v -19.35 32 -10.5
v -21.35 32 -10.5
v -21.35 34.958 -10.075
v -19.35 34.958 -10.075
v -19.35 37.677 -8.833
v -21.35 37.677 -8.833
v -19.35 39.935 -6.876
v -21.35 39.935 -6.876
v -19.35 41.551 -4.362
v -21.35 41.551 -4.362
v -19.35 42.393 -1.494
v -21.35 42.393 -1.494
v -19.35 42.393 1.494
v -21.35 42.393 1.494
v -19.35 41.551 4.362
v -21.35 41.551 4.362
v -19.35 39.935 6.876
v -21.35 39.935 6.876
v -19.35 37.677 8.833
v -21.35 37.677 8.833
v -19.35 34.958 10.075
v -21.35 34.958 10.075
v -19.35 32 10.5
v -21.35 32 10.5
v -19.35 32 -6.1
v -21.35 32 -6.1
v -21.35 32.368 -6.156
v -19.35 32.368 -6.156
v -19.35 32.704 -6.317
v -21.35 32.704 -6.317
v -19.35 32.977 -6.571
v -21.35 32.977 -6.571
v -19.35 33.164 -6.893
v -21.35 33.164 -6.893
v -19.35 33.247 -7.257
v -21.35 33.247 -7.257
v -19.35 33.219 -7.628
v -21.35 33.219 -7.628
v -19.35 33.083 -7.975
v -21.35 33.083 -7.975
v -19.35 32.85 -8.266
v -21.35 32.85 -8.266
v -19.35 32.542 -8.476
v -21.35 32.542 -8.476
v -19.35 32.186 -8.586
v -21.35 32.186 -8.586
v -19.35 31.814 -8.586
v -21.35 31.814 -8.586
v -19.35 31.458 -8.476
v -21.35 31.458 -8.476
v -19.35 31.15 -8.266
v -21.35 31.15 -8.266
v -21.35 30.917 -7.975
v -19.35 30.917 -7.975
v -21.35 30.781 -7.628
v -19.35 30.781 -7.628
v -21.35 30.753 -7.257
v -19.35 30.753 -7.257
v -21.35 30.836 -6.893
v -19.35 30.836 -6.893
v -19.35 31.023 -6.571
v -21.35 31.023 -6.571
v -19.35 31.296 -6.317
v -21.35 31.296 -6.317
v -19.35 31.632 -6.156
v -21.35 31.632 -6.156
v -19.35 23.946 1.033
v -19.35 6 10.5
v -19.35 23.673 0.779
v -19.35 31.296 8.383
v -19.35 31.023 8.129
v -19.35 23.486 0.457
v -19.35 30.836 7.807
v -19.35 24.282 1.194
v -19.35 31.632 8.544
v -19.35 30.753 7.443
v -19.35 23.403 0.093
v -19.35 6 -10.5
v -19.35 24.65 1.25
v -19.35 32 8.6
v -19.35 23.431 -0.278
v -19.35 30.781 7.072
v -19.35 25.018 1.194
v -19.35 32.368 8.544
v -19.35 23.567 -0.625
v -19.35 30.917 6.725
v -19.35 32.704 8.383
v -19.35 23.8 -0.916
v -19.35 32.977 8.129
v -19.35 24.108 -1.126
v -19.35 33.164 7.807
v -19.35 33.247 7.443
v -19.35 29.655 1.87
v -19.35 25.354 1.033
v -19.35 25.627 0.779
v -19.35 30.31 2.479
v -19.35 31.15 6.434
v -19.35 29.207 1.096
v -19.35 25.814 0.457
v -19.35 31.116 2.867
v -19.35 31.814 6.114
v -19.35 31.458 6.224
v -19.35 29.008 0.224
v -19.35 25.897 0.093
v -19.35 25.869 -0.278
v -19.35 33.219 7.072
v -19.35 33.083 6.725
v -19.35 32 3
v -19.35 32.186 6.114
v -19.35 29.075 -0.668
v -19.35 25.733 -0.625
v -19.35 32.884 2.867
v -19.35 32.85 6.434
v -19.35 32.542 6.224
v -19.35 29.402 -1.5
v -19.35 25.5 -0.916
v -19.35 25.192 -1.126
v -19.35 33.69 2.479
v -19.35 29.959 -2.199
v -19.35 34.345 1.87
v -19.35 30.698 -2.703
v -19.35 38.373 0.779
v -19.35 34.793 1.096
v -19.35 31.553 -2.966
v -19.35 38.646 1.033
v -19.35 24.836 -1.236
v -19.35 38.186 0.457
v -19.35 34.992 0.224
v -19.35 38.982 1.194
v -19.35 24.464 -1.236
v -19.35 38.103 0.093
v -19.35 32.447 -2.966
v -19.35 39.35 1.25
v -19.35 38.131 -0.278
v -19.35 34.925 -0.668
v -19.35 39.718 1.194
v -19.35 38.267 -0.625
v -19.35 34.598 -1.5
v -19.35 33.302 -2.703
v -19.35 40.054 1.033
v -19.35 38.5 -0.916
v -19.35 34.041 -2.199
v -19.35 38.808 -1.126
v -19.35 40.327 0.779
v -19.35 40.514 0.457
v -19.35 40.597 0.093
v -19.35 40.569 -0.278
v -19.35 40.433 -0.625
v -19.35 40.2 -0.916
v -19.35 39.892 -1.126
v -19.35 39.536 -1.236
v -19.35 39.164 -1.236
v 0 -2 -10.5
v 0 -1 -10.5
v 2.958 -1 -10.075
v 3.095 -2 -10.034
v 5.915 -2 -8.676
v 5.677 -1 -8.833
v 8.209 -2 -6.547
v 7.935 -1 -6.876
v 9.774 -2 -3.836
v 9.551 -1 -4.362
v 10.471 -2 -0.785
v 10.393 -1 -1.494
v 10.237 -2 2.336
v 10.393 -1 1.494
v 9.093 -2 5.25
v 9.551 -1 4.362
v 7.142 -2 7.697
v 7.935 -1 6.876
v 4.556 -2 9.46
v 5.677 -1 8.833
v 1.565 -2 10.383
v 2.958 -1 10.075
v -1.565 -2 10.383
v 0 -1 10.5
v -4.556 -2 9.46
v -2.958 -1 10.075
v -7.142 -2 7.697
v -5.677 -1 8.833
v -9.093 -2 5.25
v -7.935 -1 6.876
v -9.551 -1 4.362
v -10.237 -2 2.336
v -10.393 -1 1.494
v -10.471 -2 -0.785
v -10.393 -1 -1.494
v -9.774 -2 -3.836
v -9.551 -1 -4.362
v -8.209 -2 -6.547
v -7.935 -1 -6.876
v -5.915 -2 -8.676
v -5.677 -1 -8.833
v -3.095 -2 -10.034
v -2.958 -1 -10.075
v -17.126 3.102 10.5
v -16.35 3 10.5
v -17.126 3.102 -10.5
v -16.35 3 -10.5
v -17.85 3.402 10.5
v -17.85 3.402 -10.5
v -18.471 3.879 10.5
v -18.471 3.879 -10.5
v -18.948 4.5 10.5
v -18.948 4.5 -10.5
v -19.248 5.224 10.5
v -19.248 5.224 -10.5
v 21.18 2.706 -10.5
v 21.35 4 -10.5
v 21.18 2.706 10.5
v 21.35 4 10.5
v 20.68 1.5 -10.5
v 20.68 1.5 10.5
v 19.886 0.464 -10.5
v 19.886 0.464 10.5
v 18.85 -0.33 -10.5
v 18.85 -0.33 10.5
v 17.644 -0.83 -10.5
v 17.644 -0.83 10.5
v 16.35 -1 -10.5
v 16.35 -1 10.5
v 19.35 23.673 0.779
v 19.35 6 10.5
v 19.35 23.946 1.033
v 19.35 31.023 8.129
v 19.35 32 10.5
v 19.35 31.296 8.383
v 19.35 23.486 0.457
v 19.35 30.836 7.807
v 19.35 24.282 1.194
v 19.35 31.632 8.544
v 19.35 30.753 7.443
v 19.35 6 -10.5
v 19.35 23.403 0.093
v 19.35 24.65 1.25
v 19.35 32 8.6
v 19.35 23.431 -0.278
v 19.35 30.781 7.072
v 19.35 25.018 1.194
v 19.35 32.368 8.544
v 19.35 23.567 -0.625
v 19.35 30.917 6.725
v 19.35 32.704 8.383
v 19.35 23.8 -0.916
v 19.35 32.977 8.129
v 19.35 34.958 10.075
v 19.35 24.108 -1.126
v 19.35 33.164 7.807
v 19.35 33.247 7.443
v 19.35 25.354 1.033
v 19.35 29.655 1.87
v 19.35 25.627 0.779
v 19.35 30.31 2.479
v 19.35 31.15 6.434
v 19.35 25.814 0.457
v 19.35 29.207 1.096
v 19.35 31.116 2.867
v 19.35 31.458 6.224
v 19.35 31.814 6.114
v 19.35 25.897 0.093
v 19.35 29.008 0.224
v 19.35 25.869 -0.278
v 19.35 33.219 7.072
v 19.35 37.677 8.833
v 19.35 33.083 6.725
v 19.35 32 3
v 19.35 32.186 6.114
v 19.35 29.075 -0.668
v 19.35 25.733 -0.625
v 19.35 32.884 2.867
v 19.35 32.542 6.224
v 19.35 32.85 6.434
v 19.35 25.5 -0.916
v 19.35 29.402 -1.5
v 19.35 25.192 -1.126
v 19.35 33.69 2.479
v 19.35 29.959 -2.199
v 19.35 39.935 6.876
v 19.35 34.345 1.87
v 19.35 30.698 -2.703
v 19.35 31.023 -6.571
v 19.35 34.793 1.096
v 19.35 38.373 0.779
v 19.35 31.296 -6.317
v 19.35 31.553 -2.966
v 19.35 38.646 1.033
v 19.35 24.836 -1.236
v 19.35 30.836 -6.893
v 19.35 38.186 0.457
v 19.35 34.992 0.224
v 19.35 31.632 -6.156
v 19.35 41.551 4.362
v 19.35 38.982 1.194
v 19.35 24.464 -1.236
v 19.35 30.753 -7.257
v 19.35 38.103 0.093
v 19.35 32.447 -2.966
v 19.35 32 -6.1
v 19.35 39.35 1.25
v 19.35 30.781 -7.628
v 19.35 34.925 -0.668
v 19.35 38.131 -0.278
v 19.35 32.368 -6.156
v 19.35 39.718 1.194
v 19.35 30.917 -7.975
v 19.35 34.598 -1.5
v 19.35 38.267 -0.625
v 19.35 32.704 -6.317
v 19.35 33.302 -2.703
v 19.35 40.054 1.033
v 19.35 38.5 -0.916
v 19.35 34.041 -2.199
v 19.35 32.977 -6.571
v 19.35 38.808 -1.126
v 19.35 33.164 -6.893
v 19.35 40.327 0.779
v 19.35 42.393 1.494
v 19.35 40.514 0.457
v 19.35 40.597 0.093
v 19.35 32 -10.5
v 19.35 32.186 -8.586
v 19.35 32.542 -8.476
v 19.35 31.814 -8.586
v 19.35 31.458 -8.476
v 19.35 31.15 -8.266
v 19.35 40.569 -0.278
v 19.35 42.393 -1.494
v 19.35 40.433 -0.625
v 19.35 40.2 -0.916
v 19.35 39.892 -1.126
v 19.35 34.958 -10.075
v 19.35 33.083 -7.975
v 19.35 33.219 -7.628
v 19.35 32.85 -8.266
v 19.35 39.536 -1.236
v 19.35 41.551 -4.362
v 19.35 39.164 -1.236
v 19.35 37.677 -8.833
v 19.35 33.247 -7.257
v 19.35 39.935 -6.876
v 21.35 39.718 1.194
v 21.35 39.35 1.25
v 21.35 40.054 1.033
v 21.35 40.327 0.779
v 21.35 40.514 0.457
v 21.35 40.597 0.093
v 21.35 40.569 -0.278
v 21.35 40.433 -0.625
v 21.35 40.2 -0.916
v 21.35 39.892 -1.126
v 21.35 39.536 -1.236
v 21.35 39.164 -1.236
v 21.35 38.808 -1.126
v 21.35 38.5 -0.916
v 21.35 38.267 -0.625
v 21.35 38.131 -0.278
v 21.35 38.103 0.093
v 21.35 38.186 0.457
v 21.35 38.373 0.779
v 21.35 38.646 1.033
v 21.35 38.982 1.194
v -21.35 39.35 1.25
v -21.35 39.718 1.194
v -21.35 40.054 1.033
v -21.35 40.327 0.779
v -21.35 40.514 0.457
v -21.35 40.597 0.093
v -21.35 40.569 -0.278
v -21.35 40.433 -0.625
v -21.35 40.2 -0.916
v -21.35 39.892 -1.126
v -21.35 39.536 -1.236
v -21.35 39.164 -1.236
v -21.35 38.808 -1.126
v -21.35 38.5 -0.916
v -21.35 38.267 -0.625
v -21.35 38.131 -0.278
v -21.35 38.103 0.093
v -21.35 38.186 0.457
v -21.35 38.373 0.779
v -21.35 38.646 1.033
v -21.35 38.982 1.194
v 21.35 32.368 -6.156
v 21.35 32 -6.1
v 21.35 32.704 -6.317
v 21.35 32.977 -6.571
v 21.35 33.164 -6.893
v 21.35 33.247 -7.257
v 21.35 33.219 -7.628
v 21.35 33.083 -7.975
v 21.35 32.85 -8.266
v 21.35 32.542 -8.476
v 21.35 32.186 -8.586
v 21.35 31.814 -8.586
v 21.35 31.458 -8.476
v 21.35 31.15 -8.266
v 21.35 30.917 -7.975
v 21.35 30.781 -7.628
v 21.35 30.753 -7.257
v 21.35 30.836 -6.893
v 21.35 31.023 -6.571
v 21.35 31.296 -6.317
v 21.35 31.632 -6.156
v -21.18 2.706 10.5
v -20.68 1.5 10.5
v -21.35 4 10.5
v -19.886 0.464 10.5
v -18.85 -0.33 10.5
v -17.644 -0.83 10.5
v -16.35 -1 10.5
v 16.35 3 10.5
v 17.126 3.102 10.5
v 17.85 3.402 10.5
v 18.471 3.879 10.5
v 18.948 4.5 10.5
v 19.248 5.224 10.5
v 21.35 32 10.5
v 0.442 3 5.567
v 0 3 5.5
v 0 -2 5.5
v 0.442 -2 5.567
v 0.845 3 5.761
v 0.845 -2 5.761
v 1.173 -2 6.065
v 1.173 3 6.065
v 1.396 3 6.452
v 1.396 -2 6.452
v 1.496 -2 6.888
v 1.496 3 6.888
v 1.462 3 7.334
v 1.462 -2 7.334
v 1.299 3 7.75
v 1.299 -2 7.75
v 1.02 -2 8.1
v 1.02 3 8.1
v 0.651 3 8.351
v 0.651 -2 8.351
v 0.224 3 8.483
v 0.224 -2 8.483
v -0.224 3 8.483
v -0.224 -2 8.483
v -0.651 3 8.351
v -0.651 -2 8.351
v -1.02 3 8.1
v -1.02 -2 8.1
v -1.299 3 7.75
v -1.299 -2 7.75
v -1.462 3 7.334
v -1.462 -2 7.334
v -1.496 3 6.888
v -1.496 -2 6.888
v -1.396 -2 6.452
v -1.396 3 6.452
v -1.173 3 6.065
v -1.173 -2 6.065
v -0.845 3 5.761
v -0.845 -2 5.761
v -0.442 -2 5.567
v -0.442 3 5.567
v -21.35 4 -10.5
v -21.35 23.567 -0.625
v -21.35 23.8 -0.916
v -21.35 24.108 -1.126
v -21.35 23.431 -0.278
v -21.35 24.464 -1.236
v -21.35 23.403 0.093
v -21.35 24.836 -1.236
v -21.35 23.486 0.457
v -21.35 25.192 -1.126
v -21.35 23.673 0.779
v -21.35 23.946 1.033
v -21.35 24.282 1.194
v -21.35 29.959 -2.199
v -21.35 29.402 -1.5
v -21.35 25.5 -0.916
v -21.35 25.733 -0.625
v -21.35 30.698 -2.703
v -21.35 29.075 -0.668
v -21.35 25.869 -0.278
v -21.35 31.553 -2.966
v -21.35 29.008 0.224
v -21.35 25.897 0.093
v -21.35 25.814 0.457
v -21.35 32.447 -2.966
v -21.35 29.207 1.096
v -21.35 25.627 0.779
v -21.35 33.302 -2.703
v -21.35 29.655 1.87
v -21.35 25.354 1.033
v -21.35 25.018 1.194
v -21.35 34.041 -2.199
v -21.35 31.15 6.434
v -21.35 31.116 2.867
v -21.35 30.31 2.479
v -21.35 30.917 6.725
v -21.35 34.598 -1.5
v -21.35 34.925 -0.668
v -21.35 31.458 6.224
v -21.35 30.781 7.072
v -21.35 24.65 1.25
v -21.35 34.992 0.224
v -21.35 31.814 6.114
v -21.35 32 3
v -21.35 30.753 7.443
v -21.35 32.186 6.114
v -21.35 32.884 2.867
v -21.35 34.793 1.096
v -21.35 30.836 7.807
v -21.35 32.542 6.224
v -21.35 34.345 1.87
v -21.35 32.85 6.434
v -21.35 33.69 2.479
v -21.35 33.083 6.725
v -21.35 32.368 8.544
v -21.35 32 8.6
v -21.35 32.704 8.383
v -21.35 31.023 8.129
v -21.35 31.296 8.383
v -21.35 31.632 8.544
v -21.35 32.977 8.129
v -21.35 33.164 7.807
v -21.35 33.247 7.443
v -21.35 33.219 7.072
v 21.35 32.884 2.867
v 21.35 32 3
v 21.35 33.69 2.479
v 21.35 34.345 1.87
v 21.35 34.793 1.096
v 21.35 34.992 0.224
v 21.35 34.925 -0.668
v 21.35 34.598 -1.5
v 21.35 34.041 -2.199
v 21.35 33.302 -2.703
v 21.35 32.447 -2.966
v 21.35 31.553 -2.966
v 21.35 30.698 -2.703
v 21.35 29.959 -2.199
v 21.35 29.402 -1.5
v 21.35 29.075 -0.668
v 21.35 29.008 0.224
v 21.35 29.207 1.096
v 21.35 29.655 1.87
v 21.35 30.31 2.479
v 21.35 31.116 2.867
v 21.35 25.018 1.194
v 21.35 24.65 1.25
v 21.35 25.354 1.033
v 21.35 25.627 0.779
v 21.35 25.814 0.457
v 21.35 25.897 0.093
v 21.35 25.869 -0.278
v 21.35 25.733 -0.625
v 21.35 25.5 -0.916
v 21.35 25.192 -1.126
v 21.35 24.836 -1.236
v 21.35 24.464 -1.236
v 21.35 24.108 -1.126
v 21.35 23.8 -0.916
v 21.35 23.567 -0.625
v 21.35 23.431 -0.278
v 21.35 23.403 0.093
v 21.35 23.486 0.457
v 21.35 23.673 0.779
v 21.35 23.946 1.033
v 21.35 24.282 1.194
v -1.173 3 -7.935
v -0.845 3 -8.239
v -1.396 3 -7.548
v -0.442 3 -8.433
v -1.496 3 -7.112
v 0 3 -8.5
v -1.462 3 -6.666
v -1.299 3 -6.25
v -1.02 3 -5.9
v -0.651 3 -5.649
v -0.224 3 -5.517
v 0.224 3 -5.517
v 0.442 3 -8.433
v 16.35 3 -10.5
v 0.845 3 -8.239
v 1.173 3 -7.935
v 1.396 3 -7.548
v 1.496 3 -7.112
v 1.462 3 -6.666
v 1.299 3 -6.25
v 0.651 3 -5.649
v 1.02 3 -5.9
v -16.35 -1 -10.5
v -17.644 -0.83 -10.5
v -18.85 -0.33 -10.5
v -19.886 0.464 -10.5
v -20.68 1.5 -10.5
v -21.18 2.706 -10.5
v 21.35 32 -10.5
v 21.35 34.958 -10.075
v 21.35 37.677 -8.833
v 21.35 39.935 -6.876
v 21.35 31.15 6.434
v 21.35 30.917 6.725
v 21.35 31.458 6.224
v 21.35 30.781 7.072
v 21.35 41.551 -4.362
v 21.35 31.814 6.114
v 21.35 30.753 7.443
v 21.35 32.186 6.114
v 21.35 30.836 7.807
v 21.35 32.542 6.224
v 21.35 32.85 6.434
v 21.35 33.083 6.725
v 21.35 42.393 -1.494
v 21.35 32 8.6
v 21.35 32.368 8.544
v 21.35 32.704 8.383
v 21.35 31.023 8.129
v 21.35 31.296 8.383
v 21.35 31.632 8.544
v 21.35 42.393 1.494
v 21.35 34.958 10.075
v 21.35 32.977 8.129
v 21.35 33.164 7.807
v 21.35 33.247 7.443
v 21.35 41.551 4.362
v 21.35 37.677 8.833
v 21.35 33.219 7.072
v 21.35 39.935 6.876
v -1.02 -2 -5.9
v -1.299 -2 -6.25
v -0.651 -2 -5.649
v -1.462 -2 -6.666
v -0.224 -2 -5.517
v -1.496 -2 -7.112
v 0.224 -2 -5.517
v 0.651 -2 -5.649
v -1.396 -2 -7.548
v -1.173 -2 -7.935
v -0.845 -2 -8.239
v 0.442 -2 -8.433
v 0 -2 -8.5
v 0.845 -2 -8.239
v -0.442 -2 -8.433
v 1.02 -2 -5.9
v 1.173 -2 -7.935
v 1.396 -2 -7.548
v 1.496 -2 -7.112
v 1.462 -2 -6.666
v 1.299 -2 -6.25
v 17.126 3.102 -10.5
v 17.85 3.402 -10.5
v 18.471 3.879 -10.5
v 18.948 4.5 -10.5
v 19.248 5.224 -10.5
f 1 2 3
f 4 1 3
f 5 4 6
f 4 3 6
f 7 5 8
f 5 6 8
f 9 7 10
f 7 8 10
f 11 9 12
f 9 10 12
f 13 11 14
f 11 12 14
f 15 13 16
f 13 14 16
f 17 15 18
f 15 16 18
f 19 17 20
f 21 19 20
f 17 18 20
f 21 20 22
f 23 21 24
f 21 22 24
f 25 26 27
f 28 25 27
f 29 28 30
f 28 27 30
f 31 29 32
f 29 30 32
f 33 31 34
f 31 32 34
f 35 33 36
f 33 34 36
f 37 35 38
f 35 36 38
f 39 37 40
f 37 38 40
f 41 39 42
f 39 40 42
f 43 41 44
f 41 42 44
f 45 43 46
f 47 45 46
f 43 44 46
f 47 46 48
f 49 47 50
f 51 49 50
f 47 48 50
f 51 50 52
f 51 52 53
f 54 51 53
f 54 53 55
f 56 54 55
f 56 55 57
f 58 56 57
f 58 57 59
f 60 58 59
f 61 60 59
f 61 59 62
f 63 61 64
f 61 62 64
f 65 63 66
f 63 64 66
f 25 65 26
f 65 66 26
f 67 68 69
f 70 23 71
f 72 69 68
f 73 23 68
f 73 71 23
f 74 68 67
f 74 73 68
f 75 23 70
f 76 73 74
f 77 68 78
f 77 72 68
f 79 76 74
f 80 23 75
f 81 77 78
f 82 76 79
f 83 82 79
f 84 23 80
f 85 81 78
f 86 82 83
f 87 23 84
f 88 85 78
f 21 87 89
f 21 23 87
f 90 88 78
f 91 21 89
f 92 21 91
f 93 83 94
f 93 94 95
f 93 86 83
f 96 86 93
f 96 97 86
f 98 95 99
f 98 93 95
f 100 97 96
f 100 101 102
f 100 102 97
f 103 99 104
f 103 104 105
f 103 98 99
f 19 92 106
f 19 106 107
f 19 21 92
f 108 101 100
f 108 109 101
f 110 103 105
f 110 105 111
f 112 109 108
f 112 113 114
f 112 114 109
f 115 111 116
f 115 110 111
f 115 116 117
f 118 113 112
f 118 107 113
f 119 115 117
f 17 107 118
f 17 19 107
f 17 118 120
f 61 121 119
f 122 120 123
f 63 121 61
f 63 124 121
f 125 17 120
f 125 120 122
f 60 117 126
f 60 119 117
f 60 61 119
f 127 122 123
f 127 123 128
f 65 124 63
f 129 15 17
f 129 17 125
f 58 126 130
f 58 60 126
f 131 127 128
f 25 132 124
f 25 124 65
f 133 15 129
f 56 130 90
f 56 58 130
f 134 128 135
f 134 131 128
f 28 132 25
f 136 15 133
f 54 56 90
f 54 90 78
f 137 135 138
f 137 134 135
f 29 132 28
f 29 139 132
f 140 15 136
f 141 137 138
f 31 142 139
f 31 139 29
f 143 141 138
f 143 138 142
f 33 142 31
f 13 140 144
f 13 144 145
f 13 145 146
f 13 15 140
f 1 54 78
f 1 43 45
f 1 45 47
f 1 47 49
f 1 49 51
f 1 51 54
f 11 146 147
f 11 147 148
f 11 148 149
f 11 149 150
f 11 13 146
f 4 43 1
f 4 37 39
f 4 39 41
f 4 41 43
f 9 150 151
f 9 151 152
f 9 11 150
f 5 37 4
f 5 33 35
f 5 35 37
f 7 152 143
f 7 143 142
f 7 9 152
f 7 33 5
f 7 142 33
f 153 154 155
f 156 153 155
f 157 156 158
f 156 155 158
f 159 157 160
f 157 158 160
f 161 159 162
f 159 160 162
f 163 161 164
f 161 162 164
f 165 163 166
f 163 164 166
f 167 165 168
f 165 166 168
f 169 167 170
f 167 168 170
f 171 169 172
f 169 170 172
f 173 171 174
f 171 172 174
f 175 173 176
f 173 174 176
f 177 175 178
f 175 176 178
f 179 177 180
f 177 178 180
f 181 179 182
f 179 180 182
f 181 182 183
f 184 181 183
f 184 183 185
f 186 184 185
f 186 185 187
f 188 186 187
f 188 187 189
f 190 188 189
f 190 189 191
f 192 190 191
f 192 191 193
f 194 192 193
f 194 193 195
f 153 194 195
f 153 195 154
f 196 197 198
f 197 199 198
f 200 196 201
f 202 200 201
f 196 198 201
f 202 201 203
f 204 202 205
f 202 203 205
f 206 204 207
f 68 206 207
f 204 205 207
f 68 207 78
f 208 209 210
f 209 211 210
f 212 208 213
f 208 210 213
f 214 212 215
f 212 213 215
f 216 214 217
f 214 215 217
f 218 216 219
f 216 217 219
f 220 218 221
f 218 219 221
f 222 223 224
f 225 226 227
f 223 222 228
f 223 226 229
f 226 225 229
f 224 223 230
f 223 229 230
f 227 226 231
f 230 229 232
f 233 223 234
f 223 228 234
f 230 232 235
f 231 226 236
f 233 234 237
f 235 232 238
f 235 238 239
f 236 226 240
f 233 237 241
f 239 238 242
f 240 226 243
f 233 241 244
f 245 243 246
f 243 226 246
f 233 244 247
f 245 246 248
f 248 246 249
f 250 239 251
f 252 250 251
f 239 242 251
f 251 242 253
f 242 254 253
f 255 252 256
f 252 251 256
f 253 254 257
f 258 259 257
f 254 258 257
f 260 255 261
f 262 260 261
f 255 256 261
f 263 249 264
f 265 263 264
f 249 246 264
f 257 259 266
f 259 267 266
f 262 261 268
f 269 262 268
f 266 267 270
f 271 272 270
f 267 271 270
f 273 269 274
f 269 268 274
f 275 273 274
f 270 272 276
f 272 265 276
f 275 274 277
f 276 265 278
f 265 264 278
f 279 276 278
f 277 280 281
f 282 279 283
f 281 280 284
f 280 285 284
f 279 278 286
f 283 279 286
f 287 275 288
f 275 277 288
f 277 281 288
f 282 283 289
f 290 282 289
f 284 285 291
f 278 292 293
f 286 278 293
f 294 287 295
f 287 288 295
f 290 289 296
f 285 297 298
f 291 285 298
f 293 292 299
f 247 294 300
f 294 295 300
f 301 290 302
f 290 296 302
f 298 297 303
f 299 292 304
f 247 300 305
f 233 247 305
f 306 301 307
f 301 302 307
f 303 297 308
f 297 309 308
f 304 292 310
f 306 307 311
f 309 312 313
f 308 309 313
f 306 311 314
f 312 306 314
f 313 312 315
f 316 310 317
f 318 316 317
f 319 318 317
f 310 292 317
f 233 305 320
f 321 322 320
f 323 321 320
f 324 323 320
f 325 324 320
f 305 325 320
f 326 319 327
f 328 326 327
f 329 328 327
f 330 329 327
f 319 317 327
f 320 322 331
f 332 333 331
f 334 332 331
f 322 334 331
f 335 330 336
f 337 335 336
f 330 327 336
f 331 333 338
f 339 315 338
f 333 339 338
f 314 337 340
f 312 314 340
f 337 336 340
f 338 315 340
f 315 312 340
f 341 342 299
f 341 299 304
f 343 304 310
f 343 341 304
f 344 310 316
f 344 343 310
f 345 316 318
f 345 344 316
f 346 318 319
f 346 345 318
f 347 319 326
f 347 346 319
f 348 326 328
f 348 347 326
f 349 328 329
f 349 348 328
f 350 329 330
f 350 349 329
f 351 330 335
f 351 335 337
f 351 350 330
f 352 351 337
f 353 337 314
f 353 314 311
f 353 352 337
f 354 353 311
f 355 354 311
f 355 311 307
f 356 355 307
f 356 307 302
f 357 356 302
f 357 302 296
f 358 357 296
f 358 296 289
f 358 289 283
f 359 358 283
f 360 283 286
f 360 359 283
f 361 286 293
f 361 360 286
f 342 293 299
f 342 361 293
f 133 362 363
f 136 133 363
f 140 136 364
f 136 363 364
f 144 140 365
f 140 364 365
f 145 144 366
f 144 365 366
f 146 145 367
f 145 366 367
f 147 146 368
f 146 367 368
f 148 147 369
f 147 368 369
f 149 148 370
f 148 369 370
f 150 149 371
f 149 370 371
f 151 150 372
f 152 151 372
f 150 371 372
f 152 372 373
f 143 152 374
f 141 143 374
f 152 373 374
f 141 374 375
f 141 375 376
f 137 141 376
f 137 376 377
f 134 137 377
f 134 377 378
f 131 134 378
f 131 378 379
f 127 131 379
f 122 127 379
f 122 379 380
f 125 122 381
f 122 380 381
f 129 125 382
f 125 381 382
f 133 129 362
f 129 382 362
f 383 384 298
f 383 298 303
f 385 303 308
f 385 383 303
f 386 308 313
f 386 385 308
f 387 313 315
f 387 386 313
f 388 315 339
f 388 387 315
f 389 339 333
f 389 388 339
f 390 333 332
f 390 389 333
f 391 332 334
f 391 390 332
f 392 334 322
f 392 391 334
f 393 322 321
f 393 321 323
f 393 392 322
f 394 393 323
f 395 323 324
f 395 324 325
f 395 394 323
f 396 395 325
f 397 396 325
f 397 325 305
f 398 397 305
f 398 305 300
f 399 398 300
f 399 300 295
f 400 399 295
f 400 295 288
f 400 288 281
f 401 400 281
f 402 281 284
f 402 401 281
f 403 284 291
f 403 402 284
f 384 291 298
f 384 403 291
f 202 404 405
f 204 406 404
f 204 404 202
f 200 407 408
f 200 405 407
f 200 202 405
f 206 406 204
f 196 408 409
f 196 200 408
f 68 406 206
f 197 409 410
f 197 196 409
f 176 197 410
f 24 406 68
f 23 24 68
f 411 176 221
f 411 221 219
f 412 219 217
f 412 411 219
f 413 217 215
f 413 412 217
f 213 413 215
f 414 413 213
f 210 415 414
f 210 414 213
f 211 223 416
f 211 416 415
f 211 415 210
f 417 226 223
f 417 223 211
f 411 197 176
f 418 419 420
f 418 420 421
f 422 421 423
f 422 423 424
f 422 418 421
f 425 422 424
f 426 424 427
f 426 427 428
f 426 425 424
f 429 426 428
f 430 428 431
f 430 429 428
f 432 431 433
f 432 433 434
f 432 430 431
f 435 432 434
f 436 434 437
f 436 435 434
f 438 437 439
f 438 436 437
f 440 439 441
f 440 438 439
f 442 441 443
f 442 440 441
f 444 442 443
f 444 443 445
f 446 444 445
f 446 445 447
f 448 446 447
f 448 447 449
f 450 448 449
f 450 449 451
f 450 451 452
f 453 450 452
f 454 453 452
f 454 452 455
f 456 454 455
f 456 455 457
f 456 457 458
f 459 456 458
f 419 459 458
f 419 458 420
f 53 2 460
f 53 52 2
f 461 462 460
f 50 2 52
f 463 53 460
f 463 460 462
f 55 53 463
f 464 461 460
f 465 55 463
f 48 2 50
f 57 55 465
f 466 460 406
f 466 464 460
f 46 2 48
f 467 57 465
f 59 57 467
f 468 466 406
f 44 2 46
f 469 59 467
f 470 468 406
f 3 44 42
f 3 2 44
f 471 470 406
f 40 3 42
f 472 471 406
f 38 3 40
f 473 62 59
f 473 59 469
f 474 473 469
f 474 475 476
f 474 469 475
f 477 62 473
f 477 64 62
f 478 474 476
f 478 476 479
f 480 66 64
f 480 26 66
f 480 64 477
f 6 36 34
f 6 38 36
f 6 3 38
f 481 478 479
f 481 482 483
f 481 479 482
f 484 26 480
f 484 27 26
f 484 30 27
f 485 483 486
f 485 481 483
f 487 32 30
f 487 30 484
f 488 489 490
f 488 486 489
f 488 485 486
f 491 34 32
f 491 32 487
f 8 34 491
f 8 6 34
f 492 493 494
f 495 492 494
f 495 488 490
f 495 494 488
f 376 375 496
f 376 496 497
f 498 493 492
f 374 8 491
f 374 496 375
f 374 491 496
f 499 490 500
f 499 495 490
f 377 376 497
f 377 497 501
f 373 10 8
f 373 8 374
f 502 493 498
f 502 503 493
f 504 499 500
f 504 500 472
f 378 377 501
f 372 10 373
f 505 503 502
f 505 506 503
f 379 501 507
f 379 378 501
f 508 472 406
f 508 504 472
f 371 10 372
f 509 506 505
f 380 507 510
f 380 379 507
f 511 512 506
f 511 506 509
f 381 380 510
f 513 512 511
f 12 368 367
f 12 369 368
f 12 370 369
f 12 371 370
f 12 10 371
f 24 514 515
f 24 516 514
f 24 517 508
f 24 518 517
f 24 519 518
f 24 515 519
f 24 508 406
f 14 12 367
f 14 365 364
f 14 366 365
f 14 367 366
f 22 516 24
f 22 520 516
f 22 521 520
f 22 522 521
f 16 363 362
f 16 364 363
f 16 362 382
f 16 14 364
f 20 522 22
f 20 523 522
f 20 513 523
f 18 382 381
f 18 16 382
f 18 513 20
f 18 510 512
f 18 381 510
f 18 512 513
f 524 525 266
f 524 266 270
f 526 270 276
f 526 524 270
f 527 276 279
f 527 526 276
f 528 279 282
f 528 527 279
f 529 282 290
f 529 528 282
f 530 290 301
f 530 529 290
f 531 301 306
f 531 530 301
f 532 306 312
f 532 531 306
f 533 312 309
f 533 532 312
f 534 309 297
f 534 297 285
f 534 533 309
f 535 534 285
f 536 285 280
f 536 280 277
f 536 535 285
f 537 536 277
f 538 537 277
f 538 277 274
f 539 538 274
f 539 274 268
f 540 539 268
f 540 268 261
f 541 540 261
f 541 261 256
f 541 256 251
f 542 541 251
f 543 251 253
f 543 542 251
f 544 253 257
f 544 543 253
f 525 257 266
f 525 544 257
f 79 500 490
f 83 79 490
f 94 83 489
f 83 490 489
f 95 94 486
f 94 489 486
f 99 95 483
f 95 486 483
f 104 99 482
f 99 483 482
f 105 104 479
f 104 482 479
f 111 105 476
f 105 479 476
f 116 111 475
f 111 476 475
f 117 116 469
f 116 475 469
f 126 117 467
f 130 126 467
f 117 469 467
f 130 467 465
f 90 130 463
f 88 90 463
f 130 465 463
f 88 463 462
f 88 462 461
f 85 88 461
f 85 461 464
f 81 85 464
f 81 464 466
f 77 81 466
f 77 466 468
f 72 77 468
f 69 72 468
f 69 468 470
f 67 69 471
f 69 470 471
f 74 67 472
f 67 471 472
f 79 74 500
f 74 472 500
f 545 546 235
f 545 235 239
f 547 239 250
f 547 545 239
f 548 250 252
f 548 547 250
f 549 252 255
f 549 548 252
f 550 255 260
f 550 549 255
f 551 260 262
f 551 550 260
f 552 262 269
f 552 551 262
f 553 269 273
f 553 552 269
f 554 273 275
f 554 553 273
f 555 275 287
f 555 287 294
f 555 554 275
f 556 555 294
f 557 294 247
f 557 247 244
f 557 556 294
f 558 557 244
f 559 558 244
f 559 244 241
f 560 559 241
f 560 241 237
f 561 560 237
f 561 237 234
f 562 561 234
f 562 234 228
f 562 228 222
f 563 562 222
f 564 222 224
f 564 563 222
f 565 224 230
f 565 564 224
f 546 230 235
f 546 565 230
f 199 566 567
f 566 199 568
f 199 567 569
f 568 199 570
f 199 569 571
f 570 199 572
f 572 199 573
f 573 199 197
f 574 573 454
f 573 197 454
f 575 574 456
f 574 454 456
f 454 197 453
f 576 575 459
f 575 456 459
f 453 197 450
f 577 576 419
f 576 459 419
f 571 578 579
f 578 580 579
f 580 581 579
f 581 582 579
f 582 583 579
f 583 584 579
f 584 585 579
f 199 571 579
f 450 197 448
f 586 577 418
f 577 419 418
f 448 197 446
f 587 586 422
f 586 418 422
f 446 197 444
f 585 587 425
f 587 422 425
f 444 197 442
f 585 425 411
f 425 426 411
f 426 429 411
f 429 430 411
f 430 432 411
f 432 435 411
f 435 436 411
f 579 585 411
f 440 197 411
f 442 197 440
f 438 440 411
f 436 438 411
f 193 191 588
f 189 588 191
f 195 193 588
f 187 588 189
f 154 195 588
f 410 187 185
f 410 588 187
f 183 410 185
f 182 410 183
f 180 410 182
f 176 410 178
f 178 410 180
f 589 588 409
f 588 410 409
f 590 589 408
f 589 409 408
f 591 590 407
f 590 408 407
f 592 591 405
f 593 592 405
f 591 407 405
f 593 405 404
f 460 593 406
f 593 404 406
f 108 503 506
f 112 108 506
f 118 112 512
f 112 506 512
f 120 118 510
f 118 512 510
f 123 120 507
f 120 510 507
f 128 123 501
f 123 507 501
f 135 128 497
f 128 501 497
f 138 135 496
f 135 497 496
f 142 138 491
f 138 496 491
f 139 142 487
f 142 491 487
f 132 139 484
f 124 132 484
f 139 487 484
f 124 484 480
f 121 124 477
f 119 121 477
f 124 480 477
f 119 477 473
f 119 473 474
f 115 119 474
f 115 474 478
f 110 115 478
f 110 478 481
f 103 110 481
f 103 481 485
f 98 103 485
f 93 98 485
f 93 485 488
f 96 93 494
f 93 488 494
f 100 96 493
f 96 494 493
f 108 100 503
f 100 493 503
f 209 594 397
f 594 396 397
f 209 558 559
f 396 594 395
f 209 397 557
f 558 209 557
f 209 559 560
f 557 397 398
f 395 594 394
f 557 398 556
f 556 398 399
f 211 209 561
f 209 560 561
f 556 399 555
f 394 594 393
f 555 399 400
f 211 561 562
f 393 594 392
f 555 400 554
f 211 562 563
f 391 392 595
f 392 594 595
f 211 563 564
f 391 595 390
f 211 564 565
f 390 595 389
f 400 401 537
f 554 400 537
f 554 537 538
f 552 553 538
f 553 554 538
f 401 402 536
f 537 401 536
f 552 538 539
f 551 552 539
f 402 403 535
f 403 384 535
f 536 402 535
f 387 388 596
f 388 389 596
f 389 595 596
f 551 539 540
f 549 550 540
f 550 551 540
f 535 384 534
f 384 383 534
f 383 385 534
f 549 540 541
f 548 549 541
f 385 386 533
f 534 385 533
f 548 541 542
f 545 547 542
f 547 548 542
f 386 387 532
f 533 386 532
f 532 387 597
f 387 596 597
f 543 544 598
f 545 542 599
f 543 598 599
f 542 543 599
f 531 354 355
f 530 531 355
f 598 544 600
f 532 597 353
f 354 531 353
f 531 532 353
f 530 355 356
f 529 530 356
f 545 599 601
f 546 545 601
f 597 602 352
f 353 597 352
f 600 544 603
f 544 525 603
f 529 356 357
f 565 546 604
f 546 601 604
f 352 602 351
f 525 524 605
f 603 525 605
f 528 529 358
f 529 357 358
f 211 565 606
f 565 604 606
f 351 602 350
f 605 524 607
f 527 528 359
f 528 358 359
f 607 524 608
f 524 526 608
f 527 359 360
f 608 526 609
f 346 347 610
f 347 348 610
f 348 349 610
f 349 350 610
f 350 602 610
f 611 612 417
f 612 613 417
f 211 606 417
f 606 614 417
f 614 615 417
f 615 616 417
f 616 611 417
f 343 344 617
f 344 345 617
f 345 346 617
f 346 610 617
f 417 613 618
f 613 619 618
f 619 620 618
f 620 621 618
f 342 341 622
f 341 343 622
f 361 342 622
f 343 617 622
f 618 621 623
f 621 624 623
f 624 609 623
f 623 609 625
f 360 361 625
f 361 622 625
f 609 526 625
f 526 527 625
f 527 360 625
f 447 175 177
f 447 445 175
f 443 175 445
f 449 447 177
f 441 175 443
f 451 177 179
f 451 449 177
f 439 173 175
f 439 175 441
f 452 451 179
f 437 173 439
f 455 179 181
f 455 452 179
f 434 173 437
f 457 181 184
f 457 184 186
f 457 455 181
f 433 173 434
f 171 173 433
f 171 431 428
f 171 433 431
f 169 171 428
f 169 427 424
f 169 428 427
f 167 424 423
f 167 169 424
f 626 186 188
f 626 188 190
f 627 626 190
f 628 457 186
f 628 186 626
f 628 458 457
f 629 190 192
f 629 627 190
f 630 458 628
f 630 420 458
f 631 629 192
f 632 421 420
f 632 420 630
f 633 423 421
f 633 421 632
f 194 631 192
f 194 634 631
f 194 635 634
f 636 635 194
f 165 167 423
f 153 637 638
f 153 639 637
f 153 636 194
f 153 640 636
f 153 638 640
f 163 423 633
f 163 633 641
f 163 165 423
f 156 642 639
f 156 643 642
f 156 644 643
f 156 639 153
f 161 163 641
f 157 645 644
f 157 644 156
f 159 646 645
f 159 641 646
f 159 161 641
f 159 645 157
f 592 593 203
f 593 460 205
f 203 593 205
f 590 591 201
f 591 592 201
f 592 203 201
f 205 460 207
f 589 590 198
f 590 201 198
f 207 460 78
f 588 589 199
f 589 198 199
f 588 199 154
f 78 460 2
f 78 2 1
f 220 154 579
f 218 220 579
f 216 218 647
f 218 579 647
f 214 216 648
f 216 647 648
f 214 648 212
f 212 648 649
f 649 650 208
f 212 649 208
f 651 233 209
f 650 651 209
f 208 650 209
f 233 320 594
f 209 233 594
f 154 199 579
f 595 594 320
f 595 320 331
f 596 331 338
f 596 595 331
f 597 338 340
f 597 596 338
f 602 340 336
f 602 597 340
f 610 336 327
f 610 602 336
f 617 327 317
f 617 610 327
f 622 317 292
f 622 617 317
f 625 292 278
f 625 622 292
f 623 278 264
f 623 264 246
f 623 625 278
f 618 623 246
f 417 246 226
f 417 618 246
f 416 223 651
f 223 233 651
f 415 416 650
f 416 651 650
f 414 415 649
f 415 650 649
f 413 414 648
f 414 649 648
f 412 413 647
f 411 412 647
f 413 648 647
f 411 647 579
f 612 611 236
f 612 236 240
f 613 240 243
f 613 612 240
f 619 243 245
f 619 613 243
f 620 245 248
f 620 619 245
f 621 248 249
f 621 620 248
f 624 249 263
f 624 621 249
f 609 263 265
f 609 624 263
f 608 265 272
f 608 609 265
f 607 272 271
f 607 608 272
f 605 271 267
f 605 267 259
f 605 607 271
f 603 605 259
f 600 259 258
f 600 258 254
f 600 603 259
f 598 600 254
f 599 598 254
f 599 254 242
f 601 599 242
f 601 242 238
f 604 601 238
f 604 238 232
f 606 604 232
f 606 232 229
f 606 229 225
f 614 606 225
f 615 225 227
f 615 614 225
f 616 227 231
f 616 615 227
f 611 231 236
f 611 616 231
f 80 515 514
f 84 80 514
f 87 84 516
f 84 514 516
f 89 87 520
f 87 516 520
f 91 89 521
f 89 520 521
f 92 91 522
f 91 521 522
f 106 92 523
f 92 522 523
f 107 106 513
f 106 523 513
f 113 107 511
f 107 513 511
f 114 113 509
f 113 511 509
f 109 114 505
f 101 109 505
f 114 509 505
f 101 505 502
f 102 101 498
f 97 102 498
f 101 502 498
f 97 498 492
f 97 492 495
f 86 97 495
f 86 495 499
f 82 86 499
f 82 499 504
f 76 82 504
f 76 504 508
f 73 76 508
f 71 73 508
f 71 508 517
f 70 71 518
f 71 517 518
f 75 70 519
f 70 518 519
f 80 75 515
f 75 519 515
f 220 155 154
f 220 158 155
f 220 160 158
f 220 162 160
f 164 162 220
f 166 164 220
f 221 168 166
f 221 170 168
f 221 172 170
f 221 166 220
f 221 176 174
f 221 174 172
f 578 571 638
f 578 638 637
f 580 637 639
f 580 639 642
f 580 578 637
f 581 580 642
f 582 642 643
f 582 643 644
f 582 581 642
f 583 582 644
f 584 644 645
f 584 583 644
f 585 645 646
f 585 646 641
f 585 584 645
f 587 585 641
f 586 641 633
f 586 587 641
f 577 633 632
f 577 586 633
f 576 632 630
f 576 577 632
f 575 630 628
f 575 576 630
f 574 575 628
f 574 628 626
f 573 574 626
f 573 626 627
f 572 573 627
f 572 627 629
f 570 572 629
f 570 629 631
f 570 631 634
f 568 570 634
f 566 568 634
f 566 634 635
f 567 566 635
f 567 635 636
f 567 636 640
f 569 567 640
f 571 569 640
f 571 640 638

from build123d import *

# Parameters (mm, degrees)
SKETCH_1_W           = 42.7
SKETCH_1_H           = 21
SKETCH_1_R           = 1.5
EXTRUDE_1_DEPTH      = 2
SKETCH_2_R           = 1.25
SKETCH_2_R_2         = 3
EXTRUDE_2_DEPTH      = 2
EXTRUDE_3_DEPTH      = 1
EXTRUDE_3_DEPTH_BACK = 3
SKETCH_3_W           = 42.7
SKETCH_3_H           = 21
SKETCH_4_R           = 10.5
SKETCH_4_R_2         = 1.5
EXTRUDE_4_DEPTH      = 1
FILLET_1_R           = 3
FILLET_2_R           = 5
CUT_EXTRUDE_START    = -4
SKETCH_6_R           = 1.5
CUT_EXTRUDE_1_DEPTH  = 4


with BuildPart() as part:
    # 草图1 → 凸台-拉伸1 (new body)
    with BuildSketch(Plane(origin=(0, 0, 0), x_dir=(1, 0, 0), z_dir=(0, 1, 0))):
        Rectangle(SKETCH_1_W, SKETCH_1_H)
        with Locations(Location((7.5, 5, 0), (0, 0, 270))):
            Circle(SKETCH_1_R, mode=Mode.SUBTRACT)
        with Locations(Location((7.5, -5, 0), (0, 0, 90))):
            Circle(SKETCH_1_R, mode=Mode.SUBTRACT)
        with Locations(Location((-7.5, -5, 0), (0, 0, 270))):
            Circle(SKETCH_1_R, mode=Mode.SUBTRACT)
        with Locations(Location((-7.5, 5, 0), (0, 0, 90))):
            Circle(SKETCH_1_R, mode=Mode.SUBTRACT)
        with BuildLine():
            Line((8.017950723, 1.550908082), (12.912587519, 1.550908082))
            ThreePointArc((12.912587519, 1.550908082), (14.126270768, 1.145131224), (14.697546856, 0))
            ThreePointArc((14.697546856, 0), (14.126270768, -1.145131224), (12.912587519, -1.550908082))
            Line((12.912587519, -1.550908082), (8.017950723, -1.550908082))
            add(Edge.make_bspline(
                [(0, -7.407271614), (2.092471107, -7.358009404), (3.043739342, -2.951912586), (6.007732496, -1.626733157), (8.017950723, -1.550908082)],
                knots=[0, 0, 0, 0, 0.496822763, 1, 1, 1, 1], degree=3))
            add(Edge.make_bspline(
                [(0, -7.407271614), (-2.092471107, -7.358009404), (-3.043739342, -2.951912586), (-6.007732496, -1.626733157), (-8.017950723, -1.550908082)],
                knots=[0, 0, 0, 0, 0.496822763, 1, 1, 1, 1], degree=3))
            Line((-8.017950723, -1.550908082), (-12.912587519, -1.550908082))
            ThreePointArc((-12.912587519, -1.550908082), (-14.126270768, -1.145131224), (-14.697546856, 0))
            ThreePointArc((-14.697546856, 0), (-14.126270768, 1.145131224), (-12.912587519, 1.550908082))
            Line((-12.912587519, 1.550908082), (-8.017950723, 1.550908082))
            add(Edge.make_bspline(
                [(0, 7.407271614), (-2.092471107, 7.358009404), (-3.043739342, 2.951912586), (-6.007732496, 1.626733157), (-8.017950723, 1.550908082)],
                knots=[0, 0, 0, 0, 0.496822763, 1, 1, 1, 1], degree=3))
            add(Edge.make_bspline(
                [(0, 7.407271614), (2.092471107, 7.358009404), (3.043739342, 2.951912586), (6.007732496, 1.626733157), (8.017950723, 1.550908082)],
                knots=[0, 0, 0, 0, 0.496822763, 1, 1, 1, 1], degree=3))
        make_face(mode=Mode.SUBTRACT)
    extrude(amount=EXTRUDE_1_DEPTH)

    # 草图2 → 凸台-拉伸2 (add)
    with BuildSketch(Plane.ZY.offset(21.35)):
        with BuildLine():
            Line((-10.5, 2), (-10.5, 32))
            ThreePointArc((-10.5, 32), (0, 42.5), (10.5, 32))
            Line((10.5, 32), (10.5, 2))
            Line((10.5, 2), (-10.5, 2))
        make_face()
        with Locations((0, 24.65)):
            Circle(SKETCH_2_R, mode=Mode.SUBTRACT)
        with Locations((-7.35, 32)):
            Circle(SKETCH_2_R, mode=Mode.SUBTRACT)
        with Locations((0, 39.35)):
            Circle(SKETCH_2_R, mode=Mode.SUBTRACT)
        with Locations((7.35, 32)):
            Circle(SKETCH_2_R, mode=Mode.SUBTRACT)
        with Locations((0, 32)):
            Circle(SKETCH_2_R_2, mode=Mode.SUBTRACT)
    extrude_2 = extrude(amount=-EXTRUDE_2_DEPTH)

    # 镜向1: 凸台-拉伸2 across plane
    add(extrude_2.mirror(Plane(origin=(0, 0, 0), x_dir=(0, 0, 1), z_dir=(1, 0, 0))))

    # 草图3 → 凸台-拉伸3 (add, two sides: drawn at the far end of the back side and taken through both)
    with BuildSketch(Plane.XZ.offset(-EXTRUDE_3_DEPTH_BACK)):
        Rectangle(SKETCH_3_W, SKETCH_3_H)
    extrude(amount=EXTRUDE_3_DEPTH + EXTRUDE_3_DEPTH_BACK)

    # 草图4 → 凸台-拉伸4 (add)
    with BuildSketch(Plane.XZ.offset(1)):
        with Locations(Location((0, 0, 0), (0, 0, 270))):
            Circle(SKETCH_4_R)
        with Locations(Location((0, 7, 0), (0, 0, 270))):
            Circle(SKETCH_4_R_2, mode=Mode.SUBTRACT)
        with Locations(Location((0, -7, 0), (0, 0, 270))):
            Circle(SKETCH_4_R_2, mode=Mode.SUBTRACT)
    extrude(amount=EXTRUDE_4_DEPTH)

    # 圆角1
    fillet_1_edges = [part.edges().sort_by_distance(p)[0] for p in [
        (19.35, 3, 0),
        (-19.35, 3, 0),
    ]]
    fillet(fillet_1_edges, radius=FILLET_1_R)

    # 圆角2
    fillet_2_edges = [part.edges().sort_by_distance(p)[0] for p in [
        (-21.35, -1, 0),
        (21.35, -1, 0),
    ]]
    fillet(fillet_2_edges, radius=FILLET_2_R)

    # 草图6 → 切除-拉伸1 (cut)
    with BuildSketch(Plane.XZ.offset(1).offset(CUT_EXTRUDE_START)):
        with Locations(Location((0, 7, 0), (0, 0, 270))):
            Circle(SKETCH_6_R)
        with Locations(Location((0, -7, 0), (0, 0, 270))):
            Circle(SKETCH_6_R)
    extrude(amount=CUT_EXTRUDE_1_DEPTH, mode=Mode.SUBTRACT)


solid = part.part
